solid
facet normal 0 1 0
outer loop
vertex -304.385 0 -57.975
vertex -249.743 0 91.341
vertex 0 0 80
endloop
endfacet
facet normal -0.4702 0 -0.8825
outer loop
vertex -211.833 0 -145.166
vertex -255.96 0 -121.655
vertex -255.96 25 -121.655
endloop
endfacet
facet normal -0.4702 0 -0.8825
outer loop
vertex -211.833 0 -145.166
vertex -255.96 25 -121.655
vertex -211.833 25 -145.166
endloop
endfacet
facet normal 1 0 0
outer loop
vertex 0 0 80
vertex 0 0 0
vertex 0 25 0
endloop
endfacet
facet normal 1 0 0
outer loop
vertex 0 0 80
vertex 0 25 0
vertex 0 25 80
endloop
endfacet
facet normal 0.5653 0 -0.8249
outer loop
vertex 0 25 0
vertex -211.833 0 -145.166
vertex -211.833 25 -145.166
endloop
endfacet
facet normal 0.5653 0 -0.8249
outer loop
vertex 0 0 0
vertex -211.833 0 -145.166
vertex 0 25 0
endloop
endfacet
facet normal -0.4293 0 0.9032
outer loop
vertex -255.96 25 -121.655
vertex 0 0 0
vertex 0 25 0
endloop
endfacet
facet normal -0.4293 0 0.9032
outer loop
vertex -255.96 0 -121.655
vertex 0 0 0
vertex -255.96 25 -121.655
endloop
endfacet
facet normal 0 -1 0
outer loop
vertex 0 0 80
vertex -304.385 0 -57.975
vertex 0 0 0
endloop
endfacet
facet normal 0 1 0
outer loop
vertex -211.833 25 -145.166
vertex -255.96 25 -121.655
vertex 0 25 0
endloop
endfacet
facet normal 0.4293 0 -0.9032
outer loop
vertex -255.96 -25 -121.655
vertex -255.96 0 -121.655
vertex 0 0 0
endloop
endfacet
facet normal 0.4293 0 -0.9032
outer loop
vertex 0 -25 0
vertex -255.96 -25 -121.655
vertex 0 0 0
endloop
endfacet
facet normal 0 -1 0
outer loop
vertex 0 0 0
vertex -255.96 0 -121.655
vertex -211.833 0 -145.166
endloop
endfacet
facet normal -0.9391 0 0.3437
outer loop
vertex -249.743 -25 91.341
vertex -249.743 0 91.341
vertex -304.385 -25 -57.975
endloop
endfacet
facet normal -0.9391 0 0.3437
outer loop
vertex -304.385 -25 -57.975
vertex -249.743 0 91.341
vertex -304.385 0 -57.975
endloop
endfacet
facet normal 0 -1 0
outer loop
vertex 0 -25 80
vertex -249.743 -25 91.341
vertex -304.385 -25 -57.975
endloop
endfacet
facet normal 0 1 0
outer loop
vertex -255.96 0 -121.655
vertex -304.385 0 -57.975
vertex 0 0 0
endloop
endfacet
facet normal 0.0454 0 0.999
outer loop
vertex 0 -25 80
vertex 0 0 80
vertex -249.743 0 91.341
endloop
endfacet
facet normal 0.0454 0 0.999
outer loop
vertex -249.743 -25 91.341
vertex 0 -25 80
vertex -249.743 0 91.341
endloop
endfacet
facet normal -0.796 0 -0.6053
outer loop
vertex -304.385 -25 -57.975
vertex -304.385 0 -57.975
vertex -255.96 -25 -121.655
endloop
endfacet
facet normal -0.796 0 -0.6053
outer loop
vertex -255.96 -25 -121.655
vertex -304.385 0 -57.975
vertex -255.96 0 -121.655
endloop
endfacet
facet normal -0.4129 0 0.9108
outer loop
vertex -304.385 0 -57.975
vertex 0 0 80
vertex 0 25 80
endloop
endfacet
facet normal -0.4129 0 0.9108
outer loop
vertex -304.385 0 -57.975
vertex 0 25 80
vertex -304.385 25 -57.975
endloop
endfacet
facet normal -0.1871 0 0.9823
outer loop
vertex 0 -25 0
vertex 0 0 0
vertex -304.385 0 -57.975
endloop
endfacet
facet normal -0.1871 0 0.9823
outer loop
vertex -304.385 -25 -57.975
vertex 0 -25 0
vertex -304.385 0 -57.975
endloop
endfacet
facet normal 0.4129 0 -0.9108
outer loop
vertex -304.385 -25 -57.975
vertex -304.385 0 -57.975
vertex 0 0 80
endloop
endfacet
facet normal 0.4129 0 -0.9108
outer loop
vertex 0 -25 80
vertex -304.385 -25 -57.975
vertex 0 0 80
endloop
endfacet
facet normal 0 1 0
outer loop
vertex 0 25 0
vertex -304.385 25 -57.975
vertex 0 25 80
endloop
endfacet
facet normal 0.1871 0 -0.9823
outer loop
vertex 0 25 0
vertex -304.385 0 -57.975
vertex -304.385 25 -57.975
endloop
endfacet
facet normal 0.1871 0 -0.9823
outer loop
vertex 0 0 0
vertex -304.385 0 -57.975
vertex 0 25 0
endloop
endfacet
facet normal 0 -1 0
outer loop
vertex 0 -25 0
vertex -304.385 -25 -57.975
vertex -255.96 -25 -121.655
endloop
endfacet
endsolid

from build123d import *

# Parameters (mm, degrees)
F1_DEPTH = 25
F2_DEPTH = 25
F3_DEPTH = 25
F4_DEPTH = 25


with BuildPart() as f1:
    # F0 (on Front) → F1 (new body)
    with BuildSketch(Plane.XZ):
        Polygon((-304.384534, -57.975239), (0, 80), (-249.742642, 91.340747), align=None)
    extrude(amount=F1_DEPTH)

    # F0 (on Front) → F2 (join)
    with BuildSketch(Plane.XZ):
        Polygon((-304.384534, -57.975239), (0, 0), (0, 80), align=None)
    extrude(amount=-F2_DEPTH)



with BuildPart() as f3:
    # F0 (on Front) → F3 (new body)
    with BuildSketch(Plane.XZ):
        Polygon((-255.960273, -121.654835), (0, 0), (-304.384534, -57.975239), align=None)
    extrude(amount=F3_DEPTH)


with BuildPart() as f1_1:
    add(f1.part)

    add(f3.part)  # F4 merges F3
    # F0 (on Front) → F4 (join)
    with BuildSketch(Plane.XZ):
        Polygon((-211.832791, -145.165797), (0, 0), (-255.960273, -121.654835), align=None)
    extrude(amount=-F4_DEPTH)


solid = f1_1.part
